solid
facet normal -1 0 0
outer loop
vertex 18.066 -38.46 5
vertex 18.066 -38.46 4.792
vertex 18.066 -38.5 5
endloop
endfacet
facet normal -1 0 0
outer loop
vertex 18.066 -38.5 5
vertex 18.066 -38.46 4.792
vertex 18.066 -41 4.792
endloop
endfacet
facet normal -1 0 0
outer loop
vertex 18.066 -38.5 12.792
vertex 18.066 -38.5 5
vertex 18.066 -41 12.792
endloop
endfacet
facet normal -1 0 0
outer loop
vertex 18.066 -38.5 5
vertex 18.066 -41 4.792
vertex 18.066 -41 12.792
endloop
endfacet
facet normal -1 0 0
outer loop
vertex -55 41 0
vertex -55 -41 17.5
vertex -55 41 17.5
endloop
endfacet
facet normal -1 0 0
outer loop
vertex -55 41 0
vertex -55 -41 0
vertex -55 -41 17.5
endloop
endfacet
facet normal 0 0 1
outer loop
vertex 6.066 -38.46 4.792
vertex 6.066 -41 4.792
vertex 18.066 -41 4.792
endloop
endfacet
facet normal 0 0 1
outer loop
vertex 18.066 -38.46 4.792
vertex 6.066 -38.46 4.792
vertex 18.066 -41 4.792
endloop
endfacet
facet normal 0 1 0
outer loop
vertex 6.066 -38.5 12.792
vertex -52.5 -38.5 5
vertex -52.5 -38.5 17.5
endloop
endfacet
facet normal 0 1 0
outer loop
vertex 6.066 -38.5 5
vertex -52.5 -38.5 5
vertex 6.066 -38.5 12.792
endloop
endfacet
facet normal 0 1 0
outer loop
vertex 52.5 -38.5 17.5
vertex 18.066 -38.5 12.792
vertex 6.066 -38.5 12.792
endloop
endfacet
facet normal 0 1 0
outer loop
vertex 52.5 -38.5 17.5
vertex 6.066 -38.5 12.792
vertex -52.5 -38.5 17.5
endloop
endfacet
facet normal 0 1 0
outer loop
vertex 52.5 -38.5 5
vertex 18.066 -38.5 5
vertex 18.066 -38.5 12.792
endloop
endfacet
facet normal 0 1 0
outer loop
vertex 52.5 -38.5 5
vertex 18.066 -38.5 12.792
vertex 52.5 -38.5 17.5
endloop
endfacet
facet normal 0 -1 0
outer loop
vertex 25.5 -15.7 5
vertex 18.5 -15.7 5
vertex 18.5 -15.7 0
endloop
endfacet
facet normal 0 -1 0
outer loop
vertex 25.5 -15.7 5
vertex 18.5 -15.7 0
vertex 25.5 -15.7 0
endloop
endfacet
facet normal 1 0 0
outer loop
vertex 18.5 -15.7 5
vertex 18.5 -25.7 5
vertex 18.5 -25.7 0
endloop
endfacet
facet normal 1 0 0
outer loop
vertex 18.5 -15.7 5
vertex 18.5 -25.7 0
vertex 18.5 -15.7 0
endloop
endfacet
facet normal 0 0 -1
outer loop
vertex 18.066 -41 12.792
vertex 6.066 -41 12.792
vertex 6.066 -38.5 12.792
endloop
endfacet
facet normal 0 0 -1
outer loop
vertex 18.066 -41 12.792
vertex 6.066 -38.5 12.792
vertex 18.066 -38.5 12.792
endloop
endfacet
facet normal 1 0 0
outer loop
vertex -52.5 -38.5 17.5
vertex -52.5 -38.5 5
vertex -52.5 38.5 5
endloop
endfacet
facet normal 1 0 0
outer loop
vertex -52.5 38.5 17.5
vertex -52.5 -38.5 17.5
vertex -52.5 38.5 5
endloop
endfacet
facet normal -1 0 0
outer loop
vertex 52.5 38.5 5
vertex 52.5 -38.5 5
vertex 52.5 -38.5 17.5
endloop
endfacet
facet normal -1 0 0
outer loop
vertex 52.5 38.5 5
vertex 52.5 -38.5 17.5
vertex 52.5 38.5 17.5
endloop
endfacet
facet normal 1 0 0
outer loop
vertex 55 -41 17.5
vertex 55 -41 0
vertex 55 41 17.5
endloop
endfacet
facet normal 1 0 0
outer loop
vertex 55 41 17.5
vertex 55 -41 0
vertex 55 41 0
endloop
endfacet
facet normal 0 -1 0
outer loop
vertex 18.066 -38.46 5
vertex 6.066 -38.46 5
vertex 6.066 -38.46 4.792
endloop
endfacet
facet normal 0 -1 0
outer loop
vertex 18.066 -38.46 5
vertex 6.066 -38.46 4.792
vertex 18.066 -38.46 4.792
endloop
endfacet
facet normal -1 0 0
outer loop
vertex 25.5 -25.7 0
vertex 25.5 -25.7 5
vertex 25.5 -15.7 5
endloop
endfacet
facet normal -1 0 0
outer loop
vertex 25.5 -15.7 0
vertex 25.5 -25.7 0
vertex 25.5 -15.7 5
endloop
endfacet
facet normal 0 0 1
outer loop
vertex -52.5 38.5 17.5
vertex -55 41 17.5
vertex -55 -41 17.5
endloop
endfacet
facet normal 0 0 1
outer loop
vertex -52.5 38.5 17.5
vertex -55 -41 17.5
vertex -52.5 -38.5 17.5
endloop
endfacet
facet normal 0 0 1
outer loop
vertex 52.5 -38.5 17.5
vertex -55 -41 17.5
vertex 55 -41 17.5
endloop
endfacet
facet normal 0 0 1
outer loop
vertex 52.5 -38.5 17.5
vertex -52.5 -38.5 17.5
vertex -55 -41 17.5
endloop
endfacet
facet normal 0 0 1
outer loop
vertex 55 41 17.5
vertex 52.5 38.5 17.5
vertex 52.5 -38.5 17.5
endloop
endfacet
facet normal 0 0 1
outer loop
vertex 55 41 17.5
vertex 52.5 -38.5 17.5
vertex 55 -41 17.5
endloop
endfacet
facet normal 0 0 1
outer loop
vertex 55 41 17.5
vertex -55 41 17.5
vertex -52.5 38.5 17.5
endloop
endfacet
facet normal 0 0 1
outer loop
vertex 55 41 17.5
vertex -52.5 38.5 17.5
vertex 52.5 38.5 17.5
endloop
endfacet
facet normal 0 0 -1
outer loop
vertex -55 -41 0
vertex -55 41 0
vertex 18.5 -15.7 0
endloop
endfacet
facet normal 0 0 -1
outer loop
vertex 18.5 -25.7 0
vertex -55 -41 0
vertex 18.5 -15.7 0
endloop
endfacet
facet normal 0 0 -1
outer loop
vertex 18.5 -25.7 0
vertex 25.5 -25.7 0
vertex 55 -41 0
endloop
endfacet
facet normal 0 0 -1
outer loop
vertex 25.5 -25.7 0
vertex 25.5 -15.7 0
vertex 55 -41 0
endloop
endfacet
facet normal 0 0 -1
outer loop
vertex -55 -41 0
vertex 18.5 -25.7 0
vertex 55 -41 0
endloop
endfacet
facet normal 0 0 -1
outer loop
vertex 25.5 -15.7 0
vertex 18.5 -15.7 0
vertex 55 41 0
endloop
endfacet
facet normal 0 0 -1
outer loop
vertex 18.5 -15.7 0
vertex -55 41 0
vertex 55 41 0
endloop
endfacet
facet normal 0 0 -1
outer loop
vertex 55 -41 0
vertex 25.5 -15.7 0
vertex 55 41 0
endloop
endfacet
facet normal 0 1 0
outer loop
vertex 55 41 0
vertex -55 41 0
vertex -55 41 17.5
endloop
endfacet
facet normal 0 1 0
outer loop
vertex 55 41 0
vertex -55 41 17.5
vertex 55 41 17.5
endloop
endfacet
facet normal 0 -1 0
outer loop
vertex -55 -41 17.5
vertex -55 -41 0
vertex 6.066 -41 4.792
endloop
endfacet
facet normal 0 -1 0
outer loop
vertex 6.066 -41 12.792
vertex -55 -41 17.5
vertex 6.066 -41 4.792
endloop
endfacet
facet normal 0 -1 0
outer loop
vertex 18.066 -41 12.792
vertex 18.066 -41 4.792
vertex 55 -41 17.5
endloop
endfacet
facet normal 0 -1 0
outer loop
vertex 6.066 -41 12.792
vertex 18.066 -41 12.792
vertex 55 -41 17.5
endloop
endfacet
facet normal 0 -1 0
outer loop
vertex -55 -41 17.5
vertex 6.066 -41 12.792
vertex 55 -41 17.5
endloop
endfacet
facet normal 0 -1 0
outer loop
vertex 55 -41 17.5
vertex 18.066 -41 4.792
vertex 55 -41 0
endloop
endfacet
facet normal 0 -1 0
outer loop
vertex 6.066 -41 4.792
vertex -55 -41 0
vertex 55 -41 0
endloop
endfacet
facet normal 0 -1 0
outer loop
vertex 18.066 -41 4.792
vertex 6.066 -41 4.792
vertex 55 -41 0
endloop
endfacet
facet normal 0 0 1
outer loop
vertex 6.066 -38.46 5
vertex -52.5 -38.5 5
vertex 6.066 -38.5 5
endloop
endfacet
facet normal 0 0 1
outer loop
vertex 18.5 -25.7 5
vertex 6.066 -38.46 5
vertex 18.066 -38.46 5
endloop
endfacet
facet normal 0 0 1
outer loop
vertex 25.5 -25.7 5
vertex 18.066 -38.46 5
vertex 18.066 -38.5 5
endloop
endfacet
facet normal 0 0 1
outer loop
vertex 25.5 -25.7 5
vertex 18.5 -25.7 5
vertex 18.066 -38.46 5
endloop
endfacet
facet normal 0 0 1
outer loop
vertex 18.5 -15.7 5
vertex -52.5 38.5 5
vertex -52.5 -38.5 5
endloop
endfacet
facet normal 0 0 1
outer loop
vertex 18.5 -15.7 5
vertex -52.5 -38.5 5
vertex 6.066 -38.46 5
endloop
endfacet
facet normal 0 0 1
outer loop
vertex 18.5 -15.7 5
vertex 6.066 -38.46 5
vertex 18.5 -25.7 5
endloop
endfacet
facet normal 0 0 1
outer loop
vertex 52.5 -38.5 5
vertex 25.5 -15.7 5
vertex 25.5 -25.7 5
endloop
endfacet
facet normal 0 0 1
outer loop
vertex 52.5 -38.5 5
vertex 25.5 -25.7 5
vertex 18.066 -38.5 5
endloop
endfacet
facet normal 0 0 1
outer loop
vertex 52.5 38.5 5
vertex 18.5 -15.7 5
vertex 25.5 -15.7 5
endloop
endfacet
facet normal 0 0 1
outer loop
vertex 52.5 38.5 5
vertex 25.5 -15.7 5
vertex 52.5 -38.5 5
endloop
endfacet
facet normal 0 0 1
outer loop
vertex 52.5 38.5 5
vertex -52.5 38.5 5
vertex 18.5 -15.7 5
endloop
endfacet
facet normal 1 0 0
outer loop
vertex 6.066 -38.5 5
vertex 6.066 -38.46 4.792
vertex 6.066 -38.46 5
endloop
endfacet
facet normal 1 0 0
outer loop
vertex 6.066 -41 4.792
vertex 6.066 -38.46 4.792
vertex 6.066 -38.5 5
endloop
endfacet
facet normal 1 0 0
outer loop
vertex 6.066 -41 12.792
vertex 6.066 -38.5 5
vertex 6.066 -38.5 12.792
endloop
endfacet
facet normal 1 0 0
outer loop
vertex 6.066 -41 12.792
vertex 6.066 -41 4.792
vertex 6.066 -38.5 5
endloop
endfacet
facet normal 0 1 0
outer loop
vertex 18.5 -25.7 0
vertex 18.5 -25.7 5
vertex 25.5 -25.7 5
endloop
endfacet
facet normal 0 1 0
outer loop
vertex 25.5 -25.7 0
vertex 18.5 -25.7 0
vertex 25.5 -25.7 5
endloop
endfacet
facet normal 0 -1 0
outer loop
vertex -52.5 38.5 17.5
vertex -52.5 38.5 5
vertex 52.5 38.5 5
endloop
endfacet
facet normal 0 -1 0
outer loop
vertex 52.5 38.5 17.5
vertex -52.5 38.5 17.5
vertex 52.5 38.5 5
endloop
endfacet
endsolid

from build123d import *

# Parameters (mm, degrees)
SKETCH1_W           = 110
SKETCH1_H           = 82
BOSS_EXTRUDE1_DEPTH = 5
SKETCH3_W           = 110
SKETCH3_H           = 2.5
BOSS_EXTRUDE2_DEPTH = 12.5
SKETCH4_W           = 2.5
SKETCH4_H           = 79.5
BOSS_EXTRUDE3_DEPTH = 12.5
SKETCH5_W           = 107.5
SKETCH5_H           = 2.5
BOSS_EXTRUDE4_DEPTH = 12.5
SKETCH6_W           = 2.5
SKETCH6_H           = 77
BOSS_EXTRUDE5_DEPTH = 12.5
SKETCH7_W           = 7
SKETCH7_H           = 10
CUT_EXTRUDE1_DEPTH  = 12.5
SKETCH8_W           = 12
SKETCH8_H           = 8
CUT_EXTRUDE2_DEPTH  = 2.54


with BuildPart() as part:
    # Sketch1 → Boss-Extrude1 (new body)
    with BuildSketch(Plane.XY):
        Rectangle(SKETCH1_W, SKETCH1_H)
    extrude(amount=BOSS_EXTRUDE1_DEPTH)

    # Sketch3 → Boss-Extrude2 (add)
    with BuildSketch(Plane.XY.offset(5)):
        with Locations((0, 39.75)):
            Rectangle(SKETCH3_W, SKETCH3_H)
    extrude(amount=BOSS_EXTRUDE2_DEPTH)

    # Sketch4 → Boss-Extrude3 (add)
    with BuildSketch(Plane.XY.offset(5)):
        with Locations((-53.75, -1.25)):
            Rectangle(SKETCH4_W, SKETCH4_H)
    extrude(amount=BOSS_EXTRUDE3_DEPTH)

    # Sketch5 → Boss-Extrude4 (add)
    with BuildSketch(Plane.XY.offset(5)):
        with Locations((1.25, -39.75)):
            Rectangle(SKETCH5_W, SKETCH5_H)
    extrude(amount=BOSS_EXTRUDE4_DEPTH)

    # Sketch6 → Boss-Extrude5 (add)
    with BuildSketch(Plane.XY.offset(5)):
        with Locations((53.75, 0)):
            Rectangle(SKETCH6_W, SKETCH6_H)
    extrude(amount=BOSS_EXTRUDE5_DEPTH)

    # Sketch7 → Cut-Extrude1 (cut)
    with BuildSketch(Plane.XY.offset(5)):
        with Locations((22, -20.7)):
            Rectangle(SKETCH7_W, SKETCH7_H)
    extrude(amount=-CUT_EXTRUDE1_DEPTH, mode=Mode.SUBTRACT)

    # Sketch8 → Cut-Extrude2 (cut)
    with BuildSketch(Plane.XZ.offset(41)):
        with Locations((12.06587737, 8.792437031)):
            Rectangle(SKETCH8_W, SKETCH8_H)
    extrude(amount=-CUT_EXTRUDE2_DEPTH, mode=Mode.SUBTRACT)


solid = part.part
